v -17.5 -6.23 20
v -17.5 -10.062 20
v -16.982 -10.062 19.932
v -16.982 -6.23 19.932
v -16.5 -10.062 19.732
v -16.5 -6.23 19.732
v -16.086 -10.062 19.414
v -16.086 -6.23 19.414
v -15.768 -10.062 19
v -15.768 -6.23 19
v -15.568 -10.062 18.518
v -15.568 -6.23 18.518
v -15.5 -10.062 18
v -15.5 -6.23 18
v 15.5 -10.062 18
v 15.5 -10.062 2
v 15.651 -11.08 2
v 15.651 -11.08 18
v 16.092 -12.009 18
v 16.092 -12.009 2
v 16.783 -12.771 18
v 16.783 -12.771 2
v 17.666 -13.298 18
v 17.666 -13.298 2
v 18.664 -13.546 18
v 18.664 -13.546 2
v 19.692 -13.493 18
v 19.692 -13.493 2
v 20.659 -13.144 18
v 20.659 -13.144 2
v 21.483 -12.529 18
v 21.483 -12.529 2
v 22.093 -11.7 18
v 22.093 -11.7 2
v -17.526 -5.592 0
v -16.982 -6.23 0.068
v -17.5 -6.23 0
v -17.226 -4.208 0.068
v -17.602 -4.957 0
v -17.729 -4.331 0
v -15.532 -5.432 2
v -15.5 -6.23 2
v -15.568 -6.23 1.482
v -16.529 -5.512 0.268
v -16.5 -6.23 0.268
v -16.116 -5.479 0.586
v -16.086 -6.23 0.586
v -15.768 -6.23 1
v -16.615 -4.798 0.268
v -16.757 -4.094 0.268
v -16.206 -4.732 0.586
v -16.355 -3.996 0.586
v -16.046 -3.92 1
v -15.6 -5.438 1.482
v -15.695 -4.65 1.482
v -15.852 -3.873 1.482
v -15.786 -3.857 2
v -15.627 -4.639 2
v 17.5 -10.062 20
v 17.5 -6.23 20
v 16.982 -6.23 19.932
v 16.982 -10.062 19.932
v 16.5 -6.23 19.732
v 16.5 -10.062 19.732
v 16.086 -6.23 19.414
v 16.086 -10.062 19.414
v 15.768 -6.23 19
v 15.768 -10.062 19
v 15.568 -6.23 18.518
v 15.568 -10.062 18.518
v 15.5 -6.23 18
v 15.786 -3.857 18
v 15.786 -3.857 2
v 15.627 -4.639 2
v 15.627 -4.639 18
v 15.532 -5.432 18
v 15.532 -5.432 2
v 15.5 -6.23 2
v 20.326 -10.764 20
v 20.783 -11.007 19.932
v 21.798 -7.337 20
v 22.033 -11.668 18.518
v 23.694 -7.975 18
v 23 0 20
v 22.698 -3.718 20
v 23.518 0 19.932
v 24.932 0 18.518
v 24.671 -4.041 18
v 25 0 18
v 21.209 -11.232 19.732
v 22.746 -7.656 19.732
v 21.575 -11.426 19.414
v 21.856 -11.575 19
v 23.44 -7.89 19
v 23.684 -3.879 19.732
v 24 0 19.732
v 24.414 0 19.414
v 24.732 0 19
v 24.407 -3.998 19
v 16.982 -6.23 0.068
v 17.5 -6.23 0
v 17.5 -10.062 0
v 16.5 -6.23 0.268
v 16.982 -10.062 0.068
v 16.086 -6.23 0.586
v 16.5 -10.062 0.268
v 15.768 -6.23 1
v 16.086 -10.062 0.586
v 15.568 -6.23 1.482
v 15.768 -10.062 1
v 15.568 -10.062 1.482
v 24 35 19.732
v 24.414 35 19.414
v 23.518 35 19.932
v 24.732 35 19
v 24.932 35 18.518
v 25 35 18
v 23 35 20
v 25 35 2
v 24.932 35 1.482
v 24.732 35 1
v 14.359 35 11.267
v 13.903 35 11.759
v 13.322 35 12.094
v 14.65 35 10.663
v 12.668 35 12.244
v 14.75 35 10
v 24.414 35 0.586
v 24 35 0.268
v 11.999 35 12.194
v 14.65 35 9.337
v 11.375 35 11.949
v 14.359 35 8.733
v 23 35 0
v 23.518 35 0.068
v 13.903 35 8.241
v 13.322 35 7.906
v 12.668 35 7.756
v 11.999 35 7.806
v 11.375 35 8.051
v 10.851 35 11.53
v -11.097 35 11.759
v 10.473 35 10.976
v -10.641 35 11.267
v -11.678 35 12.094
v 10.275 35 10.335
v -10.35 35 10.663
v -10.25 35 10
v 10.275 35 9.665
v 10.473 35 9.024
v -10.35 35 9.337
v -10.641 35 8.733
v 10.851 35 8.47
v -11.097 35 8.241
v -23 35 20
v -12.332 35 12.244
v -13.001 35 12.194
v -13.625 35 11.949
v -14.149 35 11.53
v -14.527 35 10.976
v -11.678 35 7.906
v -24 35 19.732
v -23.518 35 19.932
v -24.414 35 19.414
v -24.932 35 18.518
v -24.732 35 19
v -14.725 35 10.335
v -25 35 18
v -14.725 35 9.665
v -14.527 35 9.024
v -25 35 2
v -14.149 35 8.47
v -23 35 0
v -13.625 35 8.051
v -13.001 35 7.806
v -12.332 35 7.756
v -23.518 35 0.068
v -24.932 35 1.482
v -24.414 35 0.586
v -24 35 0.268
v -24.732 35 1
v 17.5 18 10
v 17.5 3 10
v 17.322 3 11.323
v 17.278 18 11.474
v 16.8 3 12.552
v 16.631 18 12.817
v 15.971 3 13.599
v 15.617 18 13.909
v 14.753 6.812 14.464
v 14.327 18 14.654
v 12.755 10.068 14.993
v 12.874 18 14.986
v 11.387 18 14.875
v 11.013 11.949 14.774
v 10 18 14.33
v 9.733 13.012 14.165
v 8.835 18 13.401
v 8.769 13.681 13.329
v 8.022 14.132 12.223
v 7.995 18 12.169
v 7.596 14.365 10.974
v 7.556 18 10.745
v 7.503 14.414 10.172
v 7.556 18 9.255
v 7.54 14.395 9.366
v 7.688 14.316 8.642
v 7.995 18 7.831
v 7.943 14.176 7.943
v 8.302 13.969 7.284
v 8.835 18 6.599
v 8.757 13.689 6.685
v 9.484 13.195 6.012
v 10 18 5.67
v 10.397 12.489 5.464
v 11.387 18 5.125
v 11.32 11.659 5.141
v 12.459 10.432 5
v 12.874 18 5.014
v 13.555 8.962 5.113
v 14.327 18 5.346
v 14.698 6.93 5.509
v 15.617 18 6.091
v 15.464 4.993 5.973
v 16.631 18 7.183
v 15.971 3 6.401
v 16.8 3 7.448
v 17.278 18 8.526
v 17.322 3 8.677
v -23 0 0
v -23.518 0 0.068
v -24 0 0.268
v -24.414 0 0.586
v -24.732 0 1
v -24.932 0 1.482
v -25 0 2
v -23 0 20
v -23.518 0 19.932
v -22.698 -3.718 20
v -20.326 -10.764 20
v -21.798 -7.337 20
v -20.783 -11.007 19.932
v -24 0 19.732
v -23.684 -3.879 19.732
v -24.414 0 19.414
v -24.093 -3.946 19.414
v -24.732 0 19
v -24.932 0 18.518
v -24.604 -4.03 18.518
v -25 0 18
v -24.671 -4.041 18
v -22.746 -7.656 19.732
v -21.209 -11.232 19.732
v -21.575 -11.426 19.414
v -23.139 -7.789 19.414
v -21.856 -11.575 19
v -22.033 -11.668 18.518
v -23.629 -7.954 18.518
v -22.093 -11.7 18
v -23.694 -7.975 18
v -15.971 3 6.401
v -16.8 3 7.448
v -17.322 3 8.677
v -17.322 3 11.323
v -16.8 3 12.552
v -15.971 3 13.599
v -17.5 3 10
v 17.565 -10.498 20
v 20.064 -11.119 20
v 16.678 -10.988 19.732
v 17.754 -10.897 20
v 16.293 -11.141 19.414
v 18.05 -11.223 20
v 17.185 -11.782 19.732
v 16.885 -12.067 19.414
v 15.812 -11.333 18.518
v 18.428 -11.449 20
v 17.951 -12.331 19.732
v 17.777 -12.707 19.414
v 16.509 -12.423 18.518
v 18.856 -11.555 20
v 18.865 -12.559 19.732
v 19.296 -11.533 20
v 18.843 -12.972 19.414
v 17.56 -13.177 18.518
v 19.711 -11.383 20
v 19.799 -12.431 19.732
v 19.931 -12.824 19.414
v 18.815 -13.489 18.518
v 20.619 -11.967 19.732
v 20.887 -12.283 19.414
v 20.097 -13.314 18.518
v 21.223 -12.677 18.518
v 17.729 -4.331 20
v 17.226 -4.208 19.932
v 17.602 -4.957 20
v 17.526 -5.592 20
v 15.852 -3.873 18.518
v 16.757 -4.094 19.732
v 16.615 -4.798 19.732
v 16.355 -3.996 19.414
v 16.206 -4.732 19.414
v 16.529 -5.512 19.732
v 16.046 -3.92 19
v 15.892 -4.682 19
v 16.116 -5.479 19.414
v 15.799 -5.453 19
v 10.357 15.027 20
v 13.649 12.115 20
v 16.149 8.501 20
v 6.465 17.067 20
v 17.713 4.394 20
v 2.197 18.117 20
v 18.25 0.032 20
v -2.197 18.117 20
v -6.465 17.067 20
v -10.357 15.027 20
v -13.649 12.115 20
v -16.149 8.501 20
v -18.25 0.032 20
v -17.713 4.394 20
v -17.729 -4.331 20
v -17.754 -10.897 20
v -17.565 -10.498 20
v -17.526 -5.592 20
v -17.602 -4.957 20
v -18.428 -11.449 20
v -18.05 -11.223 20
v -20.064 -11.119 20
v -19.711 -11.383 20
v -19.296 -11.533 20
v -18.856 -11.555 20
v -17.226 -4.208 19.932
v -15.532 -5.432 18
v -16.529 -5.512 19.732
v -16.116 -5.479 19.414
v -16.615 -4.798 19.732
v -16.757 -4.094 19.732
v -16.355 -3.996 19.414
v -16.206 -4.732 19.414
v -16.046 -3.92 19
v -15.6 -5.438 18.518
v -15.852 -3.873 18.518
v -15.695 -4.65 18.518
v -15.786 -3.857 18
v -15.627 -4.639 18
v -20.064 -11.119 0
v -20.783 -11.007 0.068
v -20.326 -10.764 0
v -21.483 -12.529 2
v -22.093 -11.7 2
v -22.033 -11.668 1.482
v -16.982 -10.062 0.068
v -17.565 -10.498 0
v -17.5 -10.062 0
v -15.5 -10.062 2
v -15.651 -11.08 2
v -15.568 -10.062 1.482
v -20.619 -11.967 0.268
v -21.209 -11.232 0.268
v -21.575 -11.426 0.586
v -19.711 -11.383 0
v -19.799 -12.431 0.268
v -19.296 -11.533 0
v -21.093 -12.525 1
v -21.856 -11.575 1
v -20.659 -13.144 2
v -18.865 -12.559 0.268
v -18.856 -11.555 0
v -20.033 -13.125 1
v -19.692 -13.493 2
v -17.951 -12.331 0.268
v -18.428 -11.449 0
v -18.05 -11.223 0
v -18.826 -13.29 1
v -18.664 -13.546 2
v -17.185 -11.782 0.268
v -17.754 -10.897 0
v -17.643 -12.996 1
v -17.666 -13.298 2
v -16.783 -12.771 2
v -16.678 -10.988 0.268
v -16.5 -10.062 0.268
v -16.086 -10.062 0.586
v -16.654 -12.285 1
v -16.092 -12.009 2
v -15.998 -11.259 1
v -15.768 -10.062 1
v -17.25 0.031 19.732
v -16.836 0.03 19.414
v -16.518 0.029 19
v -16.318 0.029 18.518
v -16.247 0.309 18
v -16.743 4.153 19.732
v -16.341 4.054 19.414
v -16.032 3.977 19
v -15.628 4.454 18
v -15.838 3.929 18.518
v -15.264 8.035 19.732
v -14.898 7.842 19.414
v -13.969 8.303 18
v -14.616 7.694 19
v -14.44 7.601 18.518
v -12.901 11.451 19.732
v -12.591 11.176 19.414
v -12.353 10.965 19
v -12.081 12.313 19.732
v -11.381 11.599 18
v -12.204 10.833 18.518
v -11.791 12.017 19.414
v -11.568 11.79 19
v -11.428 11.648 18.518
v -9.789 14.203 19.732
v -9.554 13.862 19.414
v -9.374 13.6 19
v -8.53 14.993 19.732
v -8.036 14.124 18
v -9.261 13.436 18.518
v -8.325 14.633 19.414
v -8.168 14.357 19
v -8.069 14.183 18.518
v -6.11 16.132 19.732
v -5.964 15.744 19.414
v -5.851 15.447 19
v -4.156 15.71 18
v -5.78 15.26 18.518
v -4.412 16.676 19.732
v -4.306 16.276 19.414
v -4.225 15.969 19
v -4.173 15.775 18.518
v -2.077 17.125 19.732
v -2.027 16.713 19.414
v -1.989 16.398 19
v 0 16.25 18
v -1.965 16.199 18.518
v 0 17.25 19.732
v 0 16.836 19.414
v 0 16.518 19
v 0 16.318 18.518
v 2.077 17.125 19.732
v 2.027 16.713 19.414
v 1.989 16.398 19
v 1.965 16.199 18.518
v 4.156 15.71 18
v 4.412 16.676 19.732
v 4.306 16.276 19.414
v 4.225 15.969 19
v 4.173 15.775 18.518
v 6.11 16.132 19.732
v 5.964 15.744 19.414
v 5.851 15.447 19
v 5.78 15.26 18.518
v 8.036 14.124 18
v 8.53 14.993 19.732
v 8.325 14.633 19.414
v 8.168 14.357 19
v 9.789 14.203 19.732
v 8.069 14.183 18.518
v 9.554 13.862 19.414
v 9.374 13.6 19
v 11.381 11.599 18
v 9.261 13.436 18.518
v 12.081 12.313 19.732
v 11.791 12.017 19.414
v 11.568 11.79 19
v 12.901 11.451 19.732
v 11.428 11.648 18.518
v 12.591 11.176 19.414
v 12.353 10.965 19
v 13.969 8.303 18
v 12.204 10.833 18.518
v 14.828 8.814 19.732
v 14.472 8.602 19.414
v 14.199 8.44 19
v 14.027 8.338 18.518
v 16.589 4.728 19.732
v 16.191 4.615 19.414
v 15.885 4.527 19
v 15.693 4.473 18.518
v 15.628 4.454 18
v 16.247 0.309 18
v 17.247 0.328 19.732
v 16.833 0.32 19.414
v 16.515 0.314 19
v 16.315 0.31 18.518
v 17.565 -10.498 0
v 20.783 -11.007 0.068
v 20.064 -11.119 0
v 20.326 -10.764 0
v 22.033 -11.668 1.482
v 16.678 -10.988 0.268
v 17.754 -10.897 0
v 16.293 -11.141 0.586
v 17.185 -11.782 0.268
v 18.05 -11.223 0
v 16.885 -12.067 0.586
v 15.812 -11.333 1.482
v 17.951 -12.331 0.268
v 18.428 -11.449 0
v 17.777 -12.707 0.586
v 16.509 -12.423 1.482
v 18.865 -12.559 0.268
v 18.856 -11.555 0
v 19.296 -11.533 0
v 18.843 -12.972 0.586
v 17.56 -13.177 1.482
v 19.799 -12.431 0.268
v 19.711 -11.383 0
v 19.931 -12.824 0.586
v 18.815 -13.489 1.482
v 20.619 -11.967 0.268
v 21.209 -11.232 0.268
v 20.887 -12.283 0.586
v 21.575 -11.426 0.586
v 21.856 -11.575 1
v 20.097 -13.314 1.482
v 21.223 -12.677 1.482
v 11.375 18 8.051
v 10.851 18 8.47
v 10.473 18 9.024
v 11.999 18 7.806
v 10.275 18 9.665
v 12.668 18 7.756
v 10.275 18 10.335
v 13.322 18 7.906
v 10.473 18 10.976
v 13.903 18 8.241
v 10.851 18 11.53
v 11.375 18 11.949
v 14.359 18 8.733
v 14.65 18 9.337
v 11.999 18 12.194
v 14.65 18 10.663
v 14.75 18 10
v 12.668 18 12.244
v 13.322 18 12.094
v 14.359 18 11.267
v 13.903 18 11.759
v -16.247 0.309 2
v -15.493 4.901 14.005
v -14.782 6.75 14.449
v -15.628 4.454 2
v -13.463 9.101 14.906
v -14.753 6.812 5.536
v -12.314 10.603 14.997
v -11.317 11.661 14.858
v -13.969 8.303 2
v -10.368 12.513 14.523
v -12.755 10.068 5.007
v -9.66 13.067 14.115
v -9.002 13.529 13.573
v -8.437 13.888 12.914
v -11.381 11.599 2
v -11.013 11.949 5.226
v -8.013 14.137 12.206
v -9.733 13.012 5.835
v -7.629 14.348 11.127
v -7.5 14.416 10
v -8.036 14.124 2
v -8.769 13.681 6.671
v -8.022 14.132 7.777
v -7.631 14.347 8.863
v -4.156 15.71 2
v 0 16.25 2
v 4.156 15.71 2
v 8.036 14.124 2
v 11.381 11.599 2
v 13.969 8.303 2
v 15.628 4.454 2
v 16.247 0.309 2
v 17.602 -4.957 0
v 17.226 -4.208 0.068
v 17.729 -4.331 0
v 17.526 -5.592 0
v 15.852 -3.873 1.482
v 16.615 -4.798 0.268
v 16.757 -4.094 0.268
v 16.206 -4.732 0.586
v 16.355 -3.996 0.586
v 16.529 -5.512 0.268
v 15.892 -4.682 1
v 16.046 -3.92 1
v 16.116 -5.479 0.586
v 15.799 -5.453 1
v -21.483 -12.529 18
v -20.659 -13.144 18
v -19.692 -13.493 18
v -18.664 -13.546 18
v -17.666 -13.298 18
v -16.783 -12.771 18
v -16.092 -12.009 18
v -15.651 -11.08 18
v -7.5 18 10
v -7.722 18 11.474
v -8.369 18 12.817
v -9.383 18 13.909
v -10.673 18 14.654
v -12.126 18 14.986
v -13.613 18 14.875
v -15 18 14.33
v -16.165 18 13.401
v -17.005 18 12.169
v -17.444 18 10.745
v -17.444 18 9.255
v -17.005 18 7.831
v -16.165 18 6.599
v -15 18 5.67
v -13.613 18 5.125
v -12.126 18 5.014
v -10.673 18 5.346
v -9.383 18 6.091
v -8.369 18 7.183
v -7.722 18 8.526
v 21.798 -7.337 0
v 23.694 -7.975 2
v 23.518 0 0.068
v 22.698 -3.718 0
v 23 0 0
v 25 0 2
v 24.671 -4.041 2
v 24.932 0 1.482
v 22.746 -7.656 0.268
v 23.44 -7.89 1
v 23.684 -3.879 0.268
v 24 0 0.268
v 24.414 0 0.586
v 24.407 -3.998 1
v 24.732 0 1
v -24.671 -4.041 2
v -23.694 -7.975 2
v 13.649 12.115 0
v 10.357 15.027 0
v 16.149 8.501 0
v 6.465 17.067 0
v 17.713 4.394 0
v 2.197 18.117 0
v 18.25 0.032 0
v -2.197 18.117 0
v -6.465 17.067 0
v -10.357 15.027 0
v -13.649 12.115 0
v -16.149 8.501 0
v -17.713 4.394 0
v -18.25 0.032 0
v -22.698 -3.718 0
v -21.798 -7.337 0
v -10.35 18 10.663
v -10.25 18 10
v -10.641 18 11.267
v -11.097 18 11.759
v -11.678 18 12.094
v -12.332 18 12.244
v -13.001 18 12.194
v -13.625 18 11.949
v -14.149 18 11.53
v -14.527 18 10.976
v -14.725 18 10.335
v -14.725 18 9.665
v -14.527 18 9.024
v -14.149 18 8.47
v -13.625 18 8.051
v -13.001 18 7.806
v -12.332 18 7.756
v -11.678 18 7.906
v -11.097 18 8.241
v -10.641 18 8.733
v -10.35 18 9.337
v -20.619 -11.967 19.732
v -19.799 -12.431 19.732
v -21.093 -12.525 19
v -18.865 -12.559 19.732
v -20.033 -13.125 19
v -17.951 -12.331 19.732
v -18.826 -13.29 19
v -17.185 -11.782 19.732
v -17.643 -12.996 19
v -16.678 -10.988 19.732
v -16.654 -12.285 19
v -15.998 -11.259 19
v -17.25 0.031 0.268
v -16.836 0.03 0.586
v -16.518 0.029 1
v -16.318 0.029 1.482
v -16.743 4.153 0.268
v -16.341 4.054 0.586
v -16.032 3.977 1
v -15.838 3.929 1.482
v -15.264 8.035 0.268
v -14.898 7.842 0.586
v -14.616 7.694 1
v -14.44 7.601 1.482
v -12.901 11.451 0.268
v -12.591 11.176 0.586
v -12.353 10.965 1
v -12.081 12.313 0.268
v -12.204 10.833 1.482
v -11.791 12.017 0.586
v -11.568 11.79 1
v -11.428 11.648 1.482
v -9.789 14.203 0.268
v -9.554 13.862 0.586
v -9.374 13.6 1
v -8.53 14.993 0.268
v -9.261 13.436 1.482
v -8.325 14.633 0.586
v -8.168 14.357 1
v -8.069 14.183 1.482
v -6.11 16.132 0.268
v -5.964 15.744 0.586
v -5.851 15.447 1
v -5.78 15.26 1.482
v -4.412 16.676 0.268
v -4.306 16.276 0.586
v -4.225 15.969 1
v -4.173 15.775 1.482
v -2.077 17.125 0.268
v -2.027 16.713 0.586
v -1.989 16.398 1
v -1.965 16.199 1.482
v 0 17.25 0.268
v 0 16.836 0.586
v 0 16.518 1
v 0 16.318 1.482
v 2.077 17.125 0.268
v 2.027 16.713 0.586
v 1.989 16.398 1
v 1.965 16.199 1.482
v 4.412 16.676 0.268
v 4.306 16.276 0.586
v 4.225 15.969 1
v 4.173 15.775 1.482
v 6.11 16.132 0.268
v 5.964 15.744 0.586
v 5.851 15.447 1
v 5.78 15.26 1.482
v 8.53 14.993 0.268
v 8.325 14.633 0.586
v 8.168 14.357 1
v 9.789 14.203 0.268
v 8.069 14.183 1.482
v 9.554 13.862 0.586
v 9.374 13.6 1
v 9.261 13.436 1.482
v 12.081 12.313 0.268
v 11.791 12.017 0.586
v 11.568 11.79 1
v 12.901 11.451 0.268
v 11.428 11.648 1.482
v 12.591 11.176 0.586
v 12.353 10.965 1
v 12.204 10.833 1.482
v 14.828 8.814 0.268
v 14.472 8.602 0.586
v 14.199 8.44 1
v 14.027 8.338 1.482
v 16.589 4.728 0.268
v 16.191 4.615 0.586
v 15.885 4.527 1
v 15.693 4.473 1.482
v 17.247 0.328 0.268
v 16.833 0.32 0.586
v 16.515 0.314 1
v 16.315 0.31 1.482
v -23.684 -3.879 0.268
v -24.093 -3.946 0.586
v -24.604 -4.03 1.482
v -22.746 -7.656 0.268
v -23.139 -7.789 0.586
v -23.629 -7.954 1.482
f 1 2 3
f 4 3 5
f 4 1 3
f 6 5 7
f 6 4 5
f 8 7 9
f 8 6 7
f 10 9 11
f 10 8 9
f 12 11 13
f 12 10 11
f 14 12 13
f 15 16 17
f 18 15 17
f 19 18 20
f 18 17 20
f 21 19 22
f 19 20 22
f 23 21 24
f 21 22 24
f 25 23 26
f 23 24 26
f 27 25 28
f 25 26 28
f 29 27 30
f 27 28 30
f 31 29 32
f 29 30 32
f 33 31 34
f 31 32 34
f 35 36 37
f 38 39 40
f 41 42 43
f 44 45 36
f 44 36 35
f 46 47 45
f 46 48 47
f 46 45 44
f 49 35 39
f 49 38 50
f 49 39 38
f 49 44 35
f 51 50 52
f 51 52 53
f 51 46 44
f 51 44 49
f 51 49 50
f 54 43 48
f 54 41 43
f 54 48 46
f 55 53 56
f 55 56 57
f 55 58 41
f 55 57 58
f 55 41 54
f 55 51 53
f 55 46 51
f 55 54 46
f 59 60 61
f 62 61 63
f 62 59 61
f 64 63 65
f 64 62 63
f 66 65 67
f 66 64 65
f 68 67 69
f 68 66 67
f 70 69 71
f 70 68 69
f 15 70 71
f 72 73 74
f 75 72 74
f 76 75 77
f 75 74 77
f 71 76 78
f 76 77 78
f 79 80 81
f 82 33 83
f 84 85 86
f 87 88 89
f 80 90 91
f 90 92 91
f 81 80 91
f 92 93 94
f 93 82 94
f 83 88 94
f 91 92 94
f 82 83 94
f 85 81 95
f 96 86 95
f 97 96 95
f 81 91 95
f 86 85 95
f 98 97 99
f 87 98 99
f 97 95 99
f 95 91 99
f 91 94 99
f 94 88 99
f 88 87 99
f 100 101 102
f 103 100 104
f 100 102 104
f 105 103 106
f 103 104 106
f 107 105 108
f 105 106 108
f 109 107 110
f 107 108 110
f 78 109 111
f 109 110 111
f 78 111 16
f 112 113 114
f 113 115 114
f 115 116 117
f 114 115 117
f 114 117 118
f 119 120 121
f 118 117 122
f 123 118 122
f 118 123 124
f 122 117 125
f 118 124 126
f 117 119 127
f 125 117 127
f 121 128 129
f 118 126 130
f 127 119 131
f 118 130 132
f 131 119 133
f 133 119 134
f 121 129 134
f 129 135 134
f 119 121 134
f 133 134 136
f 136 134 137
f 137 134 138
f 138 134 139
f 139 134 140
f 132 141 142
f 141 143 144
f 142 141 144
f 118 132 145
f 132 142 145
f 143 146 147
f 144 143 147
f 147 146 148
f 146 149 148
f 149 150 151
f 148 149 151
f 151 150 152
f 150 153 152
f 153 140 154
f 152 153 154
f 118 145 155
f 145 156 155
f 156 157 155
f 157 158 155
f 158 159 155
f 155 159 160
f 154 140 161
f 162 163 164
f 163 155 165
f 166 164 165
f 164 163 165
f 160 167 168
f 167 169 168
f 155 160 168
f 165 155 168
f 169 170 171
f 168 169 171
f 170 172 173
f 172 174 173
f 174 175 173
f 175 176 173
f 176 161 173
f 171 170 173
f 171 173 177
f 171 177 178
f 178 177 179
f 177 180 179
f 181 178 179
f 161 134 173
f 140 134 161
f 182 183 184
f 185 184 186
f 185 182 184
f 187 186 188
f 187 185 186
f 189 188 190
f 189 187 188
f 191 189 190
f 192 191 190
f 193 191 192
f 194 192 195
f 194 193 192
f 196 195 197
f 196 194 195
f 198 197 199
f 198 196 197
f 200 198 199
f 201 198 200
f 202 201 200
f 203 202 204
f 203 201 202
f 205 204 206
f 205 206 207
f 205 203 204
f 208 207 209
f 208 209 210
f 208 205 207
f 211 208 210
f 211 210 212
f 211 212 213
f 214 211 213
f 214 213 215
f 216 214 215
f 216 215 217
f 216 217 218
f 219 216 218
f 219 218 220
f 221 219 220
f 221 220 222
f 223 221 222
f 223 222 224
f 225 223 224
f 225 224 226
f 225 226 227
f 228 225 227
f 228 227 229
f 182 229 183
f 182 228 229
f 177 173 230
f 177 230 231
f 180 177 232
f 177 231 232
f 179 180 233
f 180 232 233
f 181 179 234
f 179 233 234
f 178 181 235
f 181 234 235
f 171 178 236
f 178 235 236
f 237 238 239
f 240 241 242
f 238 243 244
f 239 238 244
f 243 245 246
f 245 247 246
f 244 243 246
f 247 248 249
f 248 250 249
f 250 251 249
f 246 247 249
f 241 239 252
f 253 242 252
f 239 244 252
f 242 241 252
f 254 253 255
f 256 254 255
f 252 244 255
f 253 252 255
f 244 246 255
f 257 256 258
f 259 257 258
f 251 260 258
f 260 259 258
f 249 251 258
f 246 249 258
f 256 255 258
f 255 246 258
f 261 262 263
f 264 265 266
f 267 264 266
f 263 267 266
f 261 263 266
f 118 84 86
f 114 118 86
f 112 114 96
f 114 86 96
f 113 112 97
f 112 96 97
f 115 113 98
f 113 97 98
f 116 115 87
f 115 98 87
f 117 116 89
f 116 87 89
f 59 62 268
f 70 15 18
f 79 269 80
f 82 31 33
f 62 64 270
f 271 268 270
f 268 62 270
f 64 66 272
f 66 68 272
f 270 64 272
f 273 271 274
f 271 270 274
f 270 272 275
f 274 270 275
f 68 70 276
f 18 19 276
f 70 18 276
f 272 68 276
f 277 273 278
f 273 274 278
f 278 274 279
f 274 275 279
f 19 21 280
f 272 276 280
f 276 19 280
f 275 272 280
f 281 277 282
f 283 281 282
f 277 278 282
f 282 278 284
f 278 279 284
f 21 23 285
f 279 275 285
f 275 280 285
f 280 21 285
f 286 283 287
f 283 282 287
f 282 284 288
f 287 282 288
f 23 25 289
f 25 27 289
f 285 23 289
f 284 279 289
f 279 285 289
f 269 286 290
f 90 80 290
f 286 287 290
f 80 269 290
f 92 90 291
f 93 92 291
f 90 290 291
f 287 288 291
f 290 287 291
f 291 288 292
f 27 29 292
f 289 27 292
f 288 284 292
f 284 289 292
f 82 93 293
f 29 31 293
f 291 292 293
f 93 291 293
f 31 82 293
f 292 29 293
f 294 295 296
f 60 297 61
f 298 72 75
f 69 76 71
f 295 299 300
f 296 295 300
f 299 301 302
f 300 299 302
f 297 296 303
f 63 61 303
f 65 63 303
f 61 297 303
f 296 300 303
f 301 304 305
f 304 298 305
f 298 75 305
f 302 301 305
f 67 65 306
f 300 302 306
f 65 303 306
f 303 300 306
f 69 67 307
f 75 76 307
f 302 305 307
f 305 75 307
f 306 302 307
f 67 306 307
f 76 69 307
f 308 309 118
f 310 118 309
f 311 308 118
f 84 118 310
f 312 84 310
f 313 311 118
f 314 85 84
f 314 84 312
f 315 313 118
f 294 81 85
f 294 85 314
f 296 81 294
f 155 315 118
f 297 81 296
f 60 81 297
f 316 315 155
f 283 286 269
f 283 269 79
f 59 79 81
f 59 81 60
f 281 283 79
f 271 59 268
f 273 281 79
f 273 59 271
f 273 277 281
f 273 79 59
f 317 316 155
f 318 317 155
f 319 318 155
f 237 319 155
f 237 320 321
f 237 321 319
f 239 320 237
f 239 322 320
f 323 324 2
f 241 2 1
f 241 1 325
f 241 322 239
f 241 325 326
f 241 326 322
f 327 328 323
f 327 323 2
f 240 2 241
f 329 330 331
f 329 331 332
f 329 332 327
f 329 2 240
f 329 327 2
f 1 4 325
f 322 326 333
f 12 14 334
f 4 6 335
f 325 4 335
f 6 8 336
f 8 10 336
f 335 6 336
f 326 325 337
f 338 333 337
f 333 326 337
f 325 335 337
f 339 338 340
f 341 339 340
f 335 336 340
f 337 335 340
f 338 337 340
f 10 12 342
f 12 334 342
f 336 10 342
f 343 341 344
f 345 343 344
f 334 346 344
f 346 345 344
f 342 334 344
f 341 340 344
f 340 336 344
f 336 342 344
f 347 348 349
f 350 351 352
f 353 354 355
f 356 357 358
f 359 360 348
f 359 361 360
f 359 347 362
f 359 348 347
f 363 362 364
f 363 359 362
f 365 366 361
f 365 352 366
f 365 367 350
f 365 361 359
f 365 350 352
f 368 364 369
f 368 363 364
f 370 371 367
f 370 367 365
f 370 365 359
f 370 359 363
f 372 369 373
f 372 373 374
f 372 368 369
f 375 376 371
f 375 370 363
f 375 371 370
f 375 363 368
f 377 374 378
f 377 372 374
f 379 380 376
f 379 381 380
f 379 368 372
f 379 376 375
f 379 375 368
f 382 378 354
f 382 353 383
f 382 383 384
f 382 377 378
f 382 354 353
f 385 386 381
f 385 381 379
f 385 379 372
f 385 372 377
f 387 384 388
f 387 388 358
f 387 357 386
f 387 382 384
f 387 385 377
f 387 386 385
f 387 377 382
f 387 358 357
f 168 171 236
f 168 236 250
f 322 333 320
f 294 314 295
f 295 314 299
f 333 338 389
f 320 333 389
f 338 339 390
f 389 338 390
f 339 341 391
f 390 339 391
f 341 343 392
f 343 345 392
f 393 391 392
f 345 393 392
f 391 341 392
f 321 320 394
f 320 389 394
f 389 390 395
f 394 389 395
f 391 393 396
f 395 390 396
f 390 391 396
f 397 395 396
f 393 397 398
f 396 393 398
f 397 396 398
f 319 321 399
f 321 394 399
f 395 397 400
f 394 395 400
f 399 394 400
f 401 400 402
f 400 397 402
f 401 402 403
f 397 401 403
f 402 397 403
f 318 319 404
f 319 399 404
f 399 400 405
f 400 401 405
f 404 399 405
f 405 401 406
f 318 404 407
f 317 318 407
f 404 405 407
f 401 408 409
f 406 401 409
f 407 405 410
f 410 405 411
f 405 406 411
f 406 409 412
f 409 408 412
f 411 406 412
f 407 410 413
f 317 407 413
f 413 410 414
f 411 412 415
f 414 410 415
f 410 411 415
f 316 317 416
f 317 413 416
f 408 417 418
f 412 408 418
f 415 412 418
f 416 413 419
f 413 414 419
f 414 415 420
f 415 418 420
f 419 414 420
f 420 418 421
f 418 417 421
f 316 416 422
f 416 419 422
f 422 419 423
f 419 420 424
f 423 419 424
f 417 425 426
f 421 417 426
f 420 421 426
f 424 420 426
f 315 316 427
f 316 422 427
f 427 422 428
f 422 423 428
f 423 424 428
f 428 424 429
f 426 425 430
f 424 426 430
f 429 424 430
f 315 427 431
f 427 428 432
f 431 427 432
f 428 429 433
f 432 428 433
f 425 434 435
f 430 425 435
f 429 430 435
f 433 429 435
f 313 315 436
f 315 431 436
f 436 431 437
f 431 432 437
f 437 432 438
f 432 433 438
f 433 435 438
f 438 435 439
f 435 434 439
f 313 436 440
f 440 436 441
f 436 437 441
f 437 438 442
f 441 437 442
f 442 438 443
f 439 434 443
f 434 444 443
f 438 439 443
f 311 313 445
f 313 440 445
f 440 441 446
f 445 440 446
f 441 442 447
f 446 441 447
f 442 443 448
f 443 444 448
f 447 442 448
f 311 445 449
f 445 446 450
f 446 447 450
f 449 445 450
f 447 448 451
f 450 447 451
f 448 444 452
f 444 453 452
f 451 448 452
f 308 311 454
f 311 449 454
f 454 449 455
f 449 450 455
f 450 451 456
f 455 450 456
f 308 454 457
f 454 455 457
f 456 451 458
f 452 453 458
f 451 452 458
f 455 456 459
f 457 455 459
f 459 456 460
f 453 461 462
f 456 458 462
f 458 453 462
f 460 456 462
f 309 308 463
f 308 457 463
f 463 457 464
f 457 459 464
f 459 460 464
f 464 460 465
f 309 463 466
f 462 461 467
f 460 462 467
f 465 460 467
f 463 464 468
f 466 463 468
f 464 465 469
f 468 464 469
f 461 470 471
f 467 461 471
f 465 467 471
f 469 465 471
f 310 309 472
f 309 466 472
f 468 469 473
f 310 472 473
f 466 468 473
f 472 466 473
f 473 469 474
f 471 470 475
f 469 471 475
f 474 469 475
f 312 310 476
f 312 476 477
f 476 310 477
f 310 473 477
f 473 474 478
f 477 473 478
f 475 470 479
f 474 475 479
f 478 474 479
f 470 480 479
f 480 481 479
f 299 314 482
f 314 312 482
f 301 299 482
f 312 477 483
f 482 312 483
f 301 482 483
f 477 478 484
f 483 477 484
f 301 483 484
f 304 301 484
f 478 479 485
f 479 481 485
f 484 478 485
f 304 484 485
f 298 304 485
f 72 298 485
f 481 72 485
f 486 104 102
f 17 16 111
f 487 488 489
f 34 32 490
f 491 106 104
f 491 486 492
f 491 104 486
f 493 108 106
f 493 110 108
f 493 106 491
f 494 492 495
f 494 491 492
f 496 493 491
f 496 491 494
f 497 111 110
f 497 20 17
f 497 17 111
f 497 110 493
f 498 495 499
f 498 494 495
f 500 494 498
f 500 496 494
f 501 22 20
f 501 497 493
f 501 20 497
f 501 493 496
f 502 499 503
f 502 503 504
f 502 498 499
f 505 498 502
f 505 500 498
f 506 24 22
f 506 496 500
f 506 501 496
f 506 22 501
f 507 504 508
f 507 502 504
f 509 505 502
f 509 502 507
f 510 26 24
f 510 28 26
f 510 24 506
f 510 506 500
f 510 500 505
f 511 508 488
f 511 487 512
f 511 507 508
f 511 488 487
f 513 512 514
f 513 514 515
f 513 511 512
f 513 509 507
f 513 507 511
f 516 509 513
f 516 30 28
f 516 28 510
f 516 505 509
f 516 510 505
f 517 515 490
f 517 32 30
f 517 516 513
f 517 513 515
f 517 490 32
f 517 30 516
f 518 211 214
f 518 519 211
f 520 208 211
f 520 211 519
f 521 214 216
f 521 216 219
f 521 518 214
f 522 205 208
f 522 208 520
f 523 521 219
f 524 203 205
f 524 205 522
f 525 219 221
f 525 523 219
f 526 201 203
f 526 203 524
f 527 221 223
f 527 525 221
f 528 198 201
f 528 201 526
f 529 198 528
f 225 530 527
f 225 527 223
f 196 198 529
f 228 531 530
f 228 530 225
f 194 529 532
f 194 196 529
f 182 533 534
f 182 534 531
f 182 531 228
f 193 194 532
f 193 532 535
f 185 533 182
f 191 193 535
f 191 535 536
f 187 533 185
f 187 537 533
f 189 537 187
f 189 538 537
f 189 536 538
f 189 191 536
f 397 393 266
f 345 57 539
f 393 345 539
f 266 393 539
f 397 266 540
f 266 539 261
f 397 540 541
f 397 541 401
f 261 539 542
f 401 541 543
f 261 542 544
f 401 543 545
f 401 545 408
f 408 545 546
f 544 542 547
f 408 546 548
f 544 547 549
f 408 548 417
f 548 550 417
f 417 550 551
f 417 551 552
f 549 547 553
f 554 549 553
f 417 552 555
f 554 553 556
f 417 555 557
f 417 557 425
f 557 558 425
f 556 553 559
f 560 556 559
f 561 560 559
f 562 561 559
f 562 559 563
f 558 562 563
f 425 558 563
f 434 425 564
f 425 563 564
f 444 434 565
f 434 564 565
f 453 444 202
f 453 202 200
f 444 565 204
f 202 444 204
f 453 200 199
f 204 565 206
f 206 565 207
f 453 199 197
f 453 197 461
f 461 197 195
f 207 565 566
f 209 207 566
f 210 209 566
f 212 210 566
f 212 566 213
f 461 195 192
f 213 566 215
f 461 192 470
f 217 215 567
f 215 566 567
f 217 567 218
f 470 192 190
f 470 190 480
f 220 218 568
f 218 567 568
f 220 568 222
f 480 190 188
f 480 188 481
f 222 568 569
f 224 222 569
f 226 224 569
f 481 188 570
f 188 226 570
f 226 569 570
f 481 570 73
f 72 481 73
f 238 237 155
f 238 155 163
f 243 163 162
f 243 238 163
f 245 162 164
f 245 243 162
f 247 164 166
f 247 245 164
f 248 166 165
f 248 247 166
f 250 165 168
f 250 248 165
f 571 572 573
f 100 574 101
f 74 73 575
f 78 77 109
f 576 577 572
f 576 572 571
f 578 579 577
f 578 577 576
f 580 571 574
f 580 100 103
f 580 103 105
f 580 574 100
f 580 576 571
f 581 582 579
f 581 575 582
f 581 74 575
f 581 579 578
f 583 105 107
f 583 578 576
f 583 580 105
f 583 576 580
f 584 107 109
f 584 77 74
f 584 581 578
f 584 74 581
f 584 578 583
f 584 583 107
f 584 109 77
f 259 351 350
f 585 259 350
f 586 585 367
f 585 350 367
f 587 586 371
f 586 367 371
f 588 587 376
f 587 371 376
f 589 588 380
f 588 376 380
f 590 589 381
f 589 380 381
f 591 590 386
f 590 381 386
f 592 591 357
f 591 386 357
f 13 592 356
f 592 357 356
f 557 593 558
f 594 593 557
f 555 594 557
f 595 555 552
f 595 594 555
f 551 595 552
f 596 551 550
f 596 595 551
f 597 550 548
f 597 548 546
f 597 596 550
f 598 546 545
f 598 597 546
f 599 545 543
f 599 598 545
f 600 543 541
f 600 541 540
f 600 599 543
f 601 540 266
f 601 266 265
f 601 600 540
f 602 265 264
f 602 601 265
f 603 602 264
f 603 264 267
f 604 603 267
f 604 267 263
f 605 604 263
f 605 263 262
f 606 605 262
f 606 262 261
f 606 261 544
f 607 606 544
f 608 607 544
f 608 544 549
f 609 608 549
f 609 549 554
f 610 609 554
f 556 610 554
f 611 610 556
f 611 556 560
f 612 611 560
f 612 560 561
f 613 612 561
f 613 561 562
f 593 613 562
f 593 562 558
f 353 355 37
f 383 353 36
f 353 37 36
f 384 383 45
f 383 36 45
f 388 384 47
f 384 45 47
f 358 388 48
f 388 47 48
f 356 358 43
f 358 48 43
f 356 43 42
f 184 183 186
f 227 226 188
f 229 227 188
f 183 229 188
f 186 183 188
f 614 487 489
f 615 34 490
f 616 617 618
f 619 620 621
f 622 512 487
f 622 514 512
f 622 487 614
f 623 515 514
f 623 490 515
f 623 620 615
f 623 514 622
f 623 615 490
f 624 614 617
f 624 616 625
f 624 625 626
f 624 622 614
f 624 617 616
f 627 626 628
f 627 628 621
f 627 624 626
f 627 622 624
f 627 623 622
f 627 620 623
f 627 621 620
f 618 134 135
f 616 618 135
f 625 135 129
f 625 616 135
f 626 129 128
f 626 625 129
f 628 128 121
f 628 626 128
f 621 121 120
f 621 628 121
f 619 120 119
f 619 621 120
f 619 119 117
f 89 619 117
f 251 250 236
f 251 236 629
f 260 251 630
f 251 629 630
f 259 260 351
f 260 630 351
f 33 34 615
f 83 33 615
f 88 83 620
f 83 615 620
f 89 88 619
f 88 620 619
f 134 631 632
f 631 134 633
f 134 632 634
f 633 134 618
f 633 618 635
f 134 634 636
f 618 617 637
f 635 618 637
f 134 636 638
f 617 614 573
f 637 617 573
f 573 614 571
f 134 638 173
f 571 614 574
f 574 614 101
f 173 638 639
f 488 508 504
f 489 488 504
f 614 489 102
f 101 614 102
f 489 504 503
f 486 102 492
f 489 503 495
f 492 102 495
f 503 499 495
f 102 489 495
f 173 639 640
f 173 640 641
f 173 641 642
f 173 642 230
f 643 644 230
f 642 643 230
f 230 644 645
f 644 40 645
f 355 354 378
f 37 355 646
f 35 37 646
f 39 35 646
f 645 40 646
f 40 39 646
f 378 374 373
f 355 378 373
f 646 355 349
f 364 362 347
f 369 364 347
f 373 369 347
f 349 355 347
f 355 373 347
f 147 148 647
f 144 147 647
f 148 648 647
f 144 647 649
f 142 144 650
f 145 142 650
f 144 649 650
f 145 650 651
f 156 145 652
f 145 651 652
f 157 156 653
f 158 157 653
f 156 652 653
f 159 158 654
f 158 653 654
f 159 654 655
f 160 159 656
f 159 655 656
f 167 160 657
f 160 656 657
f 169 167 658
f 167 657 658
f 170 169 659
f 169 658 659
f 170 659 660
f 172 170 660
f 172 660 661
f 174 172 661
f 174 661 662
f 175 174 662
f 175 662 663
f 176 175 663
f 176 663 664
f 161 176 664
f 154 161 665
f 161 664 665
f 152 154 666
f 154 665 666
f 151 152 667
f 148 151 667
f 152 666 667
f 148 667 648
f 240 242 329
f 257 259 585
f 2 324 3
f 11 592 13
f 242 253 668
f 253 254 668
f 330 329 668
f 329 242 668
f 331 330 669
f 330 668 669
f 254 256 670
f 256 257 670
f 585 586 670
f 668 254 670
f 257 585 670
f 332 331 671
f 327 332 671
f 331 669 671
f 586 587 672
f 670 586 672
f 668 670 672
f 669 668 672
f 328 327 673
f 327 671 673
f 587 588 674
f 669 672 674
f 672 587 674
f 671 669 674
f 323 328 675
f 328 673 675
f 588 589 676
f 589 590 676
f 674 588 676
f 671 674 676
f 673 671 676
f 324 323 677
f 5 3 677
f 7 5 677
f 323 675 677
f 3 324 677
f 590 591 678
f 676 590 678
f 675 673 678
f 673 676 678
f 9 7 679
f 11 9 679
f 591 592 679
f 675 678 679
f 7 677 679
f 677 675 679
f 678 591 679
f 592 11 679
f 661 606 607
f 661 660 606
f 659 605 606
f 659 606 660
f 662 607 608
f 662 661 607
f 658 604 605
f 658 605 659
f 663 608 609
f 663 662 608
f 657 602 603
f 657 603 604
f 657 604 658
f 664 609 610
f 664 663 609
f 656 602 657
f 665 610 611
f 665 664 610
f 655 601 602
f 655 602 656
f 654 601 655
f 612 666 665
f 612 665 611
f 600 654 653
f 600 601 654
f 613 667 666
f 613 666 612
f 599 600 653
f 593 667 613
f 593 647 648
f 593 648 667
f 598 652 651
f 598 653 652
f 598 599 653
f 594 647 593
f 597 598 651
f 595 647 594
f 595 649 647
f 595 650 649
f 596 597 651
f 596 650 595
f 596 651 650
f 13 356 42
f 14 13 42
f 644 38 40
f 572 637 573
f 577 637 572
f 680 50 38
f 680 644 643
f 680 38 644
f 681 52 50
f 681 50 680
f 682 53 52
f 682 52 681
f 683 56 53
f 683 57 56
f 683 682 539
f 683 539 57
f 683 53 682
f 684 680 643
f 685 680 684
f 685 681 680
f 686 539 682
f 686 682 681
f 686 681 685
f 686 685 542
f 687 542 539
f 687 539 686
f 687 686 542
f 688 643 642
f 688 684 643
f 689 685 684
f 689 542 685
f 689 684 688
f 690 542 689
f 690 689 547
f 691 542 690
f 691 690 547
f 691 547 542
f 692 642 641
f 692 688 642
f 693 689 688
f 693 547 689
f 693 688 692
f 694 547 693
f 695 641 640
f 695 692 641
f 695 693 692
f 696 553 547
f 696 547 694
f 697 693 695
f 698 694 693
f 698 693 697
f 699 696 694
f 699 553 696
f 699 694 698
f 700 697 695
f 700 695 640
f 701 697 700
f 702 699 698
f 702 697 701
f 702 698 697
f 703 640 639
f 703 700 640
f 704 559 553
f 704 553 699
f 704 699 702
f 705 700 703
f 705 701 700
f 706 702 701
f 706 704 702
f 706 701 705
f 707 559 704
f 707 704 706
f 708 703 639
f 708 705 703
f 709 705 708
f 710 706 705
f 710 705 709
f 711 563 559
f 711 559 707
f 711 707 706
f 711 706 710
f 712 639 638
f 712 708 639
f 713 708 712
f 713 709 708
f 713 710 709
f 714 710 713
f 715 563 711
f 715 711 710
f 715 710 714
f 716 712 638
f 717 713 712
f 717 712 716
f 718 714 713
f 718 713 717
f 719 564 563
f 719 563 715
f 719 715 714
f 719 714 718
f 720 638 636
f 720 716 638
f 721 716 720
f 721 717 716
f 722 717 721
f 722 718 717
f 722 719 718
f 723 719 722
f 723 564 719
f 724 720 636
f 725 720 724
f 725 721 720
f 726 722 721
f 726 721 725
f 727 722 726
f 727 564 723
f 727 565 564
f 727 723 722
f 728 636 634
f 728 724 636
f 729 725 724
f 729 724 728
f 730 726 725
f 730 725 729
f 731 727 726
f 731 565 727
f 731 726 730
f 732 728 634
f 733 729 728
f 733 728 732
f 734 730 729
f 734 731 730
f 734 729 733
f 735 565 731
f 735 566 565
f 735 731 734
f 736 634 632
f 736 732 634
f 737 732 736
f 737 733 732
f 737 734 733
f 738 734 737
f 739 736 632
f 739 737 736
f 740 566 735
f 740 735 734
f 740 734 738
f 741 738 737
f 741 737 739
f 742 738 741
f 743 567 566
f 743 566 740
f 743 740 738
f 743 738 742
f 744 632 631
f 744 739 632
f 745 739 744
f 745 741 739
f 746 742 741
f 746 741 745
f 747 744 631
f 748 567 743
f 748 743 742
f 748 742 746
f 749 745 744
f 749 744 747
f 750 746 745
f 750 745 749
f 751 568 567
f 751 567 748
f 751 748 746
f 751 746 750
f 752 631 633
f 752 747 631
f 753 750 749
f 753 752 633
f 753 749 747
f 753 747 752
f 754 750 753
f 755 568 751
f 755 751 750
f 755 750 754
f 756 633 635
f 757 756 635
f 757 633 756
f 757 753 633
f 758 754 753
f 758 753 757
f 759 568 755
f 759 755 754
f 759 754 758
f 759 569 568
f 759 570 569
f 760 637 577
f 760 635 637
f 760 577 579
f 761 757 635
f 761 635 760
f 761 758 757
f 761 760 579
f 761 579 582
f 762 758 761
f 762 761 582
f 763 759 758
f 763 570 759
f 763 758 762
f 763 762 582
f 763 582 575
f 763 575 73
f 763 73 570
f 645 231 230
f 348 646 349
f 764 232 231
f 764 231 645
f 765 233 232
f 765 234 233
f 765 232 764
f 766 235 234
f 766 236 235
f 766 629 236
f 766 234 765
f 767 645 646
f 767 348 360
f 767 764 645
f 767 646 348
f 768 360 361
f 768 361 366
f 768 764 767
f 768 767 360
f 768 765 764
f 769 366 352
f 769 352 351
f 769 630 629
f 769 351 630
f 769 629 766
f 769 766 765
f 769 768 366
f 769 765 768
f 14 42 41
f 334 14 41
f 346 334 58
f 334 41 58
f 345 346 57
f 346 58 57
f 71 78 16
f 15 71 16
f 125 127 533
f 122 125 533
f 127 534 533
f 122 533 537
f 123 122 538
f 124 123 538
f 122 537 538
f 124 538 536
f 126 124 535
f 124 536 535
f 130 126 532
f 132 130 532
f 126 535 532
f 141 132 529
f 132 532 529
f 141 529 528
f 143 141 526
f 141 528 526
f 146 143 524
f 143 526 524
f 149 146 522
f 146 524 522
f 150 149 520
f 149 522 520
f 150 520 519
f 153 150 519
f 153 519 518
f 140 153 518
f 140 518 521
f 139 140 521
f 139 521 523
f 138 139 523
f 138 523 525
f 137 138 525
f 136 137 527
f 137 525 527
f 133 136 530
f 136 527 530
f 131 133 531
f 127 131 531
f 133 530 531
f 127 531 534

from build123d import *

# Parameters (mm, degrees)
F1_DEPTH = 20
F3_D     = 4.5
F3_DEPTH = 25
F3_TIP   = 1.3519363928
F6_R     = 2
F5_R     = 5
F7_DEPTH = 15
F8_DEPTH = 10


with BuildPart() as f1:
    # F0 (on Top) → F1 (new body)
    with BuildSketch(Plane.XY):
        with BuildLine():
            ThreePointArc((-15.7857142857, -3.8566467935), (0, 16.25), (15.7857142857, -3.8566467935))
            ThreePointArc((15.7857142857, -3.8566467935), (15.5716855121, -5.0347392879), (15.5, -6.2299678972))
            Line((15.5, -6.2299678972), (15.5, -10.0623058987))
            ThreePointArc((15.5, -10.0623058987), (18.1560750612, -13.4590382547), (22.0930232558, -11.7003556962))
            ThreePointArc((22.0930232558, -11.7003556962), (24.2623739708, -6.0280352771), (25, 0))
            Line((25, 0), (25, 25))
            Line((25, 25), (0, 25))
            Line((0, 25), (-25, 25))
            Line((-25, 25), (-25, 0))
            ThreePointArc((-25, 0), (-24.2623739708, -6.0280352771), (-22.0930232558, -11.7003556962))
            ThreePointArc((-22.0930232558, -11.7003556962), (-18.1560750612, -13.4590382547), (-15.5, -10.0623058987))
            Line((-15.5, -10.0623058987), (-15.5, -6.2299678972))
            ThreePointArc((-15.5, -6.2299678972), (-15.5716855121, -5.0347392879), (-15.7857142857, -3.8566467935))
        make_face()
    extrude(amount=F1_DEPTH)

    # F3
    with Locations(Plane(origin=(0, 25, 0), x_dir=(-1, 0, 0), z_dir=(0, 1, 0))):
        with Locations((-12.5, 10), (12.5, 10)):
            Hole(F3_D / 2, depth=F3_DEPTH)
            with Locations((0, 0, -(F3_DEPTH + F3_TIP / 2))):  # 118° drill point
                Cone(0, F3_D / 2, F3_TIP, mode=Mode.SUBTRACT)

    # F6
    f6_edges = [f1.edges().sort_by_distance(p)[0] for p in [
        (-25, 12.5, 0),
        (-24.262374, -6.028035, 0),
        (0, 16.25, 0),
        (18.156075, -13.459038, 0),
        (25, 12.5, 20),
        (0, 16.25, 20),
        (-18.156075, -13.459038, 20),
    ]]
    fillet(f6_edges, radius=F6_R)

    # F5 (on offset) → F7 (cut)
    with BuildSketch(Plane.XZ.offset(-18)):
        with Locations((-12.5, 10)):
            Circle(F5_R)
        with Locations((12.5, 10)):
            Circle(F5_R)
    extrude(amount=F7_DEPTH, mode=Mode.SUBTRACT)

    # F8 (add): a face of the model
    f8_faces = [f1.faces().sort_by_distance(p)[0] for p in [
        (0, 25, 10),
    ]]
    extrude(f8_faces, amount=F8_DEPTH)


solid = f1.part
